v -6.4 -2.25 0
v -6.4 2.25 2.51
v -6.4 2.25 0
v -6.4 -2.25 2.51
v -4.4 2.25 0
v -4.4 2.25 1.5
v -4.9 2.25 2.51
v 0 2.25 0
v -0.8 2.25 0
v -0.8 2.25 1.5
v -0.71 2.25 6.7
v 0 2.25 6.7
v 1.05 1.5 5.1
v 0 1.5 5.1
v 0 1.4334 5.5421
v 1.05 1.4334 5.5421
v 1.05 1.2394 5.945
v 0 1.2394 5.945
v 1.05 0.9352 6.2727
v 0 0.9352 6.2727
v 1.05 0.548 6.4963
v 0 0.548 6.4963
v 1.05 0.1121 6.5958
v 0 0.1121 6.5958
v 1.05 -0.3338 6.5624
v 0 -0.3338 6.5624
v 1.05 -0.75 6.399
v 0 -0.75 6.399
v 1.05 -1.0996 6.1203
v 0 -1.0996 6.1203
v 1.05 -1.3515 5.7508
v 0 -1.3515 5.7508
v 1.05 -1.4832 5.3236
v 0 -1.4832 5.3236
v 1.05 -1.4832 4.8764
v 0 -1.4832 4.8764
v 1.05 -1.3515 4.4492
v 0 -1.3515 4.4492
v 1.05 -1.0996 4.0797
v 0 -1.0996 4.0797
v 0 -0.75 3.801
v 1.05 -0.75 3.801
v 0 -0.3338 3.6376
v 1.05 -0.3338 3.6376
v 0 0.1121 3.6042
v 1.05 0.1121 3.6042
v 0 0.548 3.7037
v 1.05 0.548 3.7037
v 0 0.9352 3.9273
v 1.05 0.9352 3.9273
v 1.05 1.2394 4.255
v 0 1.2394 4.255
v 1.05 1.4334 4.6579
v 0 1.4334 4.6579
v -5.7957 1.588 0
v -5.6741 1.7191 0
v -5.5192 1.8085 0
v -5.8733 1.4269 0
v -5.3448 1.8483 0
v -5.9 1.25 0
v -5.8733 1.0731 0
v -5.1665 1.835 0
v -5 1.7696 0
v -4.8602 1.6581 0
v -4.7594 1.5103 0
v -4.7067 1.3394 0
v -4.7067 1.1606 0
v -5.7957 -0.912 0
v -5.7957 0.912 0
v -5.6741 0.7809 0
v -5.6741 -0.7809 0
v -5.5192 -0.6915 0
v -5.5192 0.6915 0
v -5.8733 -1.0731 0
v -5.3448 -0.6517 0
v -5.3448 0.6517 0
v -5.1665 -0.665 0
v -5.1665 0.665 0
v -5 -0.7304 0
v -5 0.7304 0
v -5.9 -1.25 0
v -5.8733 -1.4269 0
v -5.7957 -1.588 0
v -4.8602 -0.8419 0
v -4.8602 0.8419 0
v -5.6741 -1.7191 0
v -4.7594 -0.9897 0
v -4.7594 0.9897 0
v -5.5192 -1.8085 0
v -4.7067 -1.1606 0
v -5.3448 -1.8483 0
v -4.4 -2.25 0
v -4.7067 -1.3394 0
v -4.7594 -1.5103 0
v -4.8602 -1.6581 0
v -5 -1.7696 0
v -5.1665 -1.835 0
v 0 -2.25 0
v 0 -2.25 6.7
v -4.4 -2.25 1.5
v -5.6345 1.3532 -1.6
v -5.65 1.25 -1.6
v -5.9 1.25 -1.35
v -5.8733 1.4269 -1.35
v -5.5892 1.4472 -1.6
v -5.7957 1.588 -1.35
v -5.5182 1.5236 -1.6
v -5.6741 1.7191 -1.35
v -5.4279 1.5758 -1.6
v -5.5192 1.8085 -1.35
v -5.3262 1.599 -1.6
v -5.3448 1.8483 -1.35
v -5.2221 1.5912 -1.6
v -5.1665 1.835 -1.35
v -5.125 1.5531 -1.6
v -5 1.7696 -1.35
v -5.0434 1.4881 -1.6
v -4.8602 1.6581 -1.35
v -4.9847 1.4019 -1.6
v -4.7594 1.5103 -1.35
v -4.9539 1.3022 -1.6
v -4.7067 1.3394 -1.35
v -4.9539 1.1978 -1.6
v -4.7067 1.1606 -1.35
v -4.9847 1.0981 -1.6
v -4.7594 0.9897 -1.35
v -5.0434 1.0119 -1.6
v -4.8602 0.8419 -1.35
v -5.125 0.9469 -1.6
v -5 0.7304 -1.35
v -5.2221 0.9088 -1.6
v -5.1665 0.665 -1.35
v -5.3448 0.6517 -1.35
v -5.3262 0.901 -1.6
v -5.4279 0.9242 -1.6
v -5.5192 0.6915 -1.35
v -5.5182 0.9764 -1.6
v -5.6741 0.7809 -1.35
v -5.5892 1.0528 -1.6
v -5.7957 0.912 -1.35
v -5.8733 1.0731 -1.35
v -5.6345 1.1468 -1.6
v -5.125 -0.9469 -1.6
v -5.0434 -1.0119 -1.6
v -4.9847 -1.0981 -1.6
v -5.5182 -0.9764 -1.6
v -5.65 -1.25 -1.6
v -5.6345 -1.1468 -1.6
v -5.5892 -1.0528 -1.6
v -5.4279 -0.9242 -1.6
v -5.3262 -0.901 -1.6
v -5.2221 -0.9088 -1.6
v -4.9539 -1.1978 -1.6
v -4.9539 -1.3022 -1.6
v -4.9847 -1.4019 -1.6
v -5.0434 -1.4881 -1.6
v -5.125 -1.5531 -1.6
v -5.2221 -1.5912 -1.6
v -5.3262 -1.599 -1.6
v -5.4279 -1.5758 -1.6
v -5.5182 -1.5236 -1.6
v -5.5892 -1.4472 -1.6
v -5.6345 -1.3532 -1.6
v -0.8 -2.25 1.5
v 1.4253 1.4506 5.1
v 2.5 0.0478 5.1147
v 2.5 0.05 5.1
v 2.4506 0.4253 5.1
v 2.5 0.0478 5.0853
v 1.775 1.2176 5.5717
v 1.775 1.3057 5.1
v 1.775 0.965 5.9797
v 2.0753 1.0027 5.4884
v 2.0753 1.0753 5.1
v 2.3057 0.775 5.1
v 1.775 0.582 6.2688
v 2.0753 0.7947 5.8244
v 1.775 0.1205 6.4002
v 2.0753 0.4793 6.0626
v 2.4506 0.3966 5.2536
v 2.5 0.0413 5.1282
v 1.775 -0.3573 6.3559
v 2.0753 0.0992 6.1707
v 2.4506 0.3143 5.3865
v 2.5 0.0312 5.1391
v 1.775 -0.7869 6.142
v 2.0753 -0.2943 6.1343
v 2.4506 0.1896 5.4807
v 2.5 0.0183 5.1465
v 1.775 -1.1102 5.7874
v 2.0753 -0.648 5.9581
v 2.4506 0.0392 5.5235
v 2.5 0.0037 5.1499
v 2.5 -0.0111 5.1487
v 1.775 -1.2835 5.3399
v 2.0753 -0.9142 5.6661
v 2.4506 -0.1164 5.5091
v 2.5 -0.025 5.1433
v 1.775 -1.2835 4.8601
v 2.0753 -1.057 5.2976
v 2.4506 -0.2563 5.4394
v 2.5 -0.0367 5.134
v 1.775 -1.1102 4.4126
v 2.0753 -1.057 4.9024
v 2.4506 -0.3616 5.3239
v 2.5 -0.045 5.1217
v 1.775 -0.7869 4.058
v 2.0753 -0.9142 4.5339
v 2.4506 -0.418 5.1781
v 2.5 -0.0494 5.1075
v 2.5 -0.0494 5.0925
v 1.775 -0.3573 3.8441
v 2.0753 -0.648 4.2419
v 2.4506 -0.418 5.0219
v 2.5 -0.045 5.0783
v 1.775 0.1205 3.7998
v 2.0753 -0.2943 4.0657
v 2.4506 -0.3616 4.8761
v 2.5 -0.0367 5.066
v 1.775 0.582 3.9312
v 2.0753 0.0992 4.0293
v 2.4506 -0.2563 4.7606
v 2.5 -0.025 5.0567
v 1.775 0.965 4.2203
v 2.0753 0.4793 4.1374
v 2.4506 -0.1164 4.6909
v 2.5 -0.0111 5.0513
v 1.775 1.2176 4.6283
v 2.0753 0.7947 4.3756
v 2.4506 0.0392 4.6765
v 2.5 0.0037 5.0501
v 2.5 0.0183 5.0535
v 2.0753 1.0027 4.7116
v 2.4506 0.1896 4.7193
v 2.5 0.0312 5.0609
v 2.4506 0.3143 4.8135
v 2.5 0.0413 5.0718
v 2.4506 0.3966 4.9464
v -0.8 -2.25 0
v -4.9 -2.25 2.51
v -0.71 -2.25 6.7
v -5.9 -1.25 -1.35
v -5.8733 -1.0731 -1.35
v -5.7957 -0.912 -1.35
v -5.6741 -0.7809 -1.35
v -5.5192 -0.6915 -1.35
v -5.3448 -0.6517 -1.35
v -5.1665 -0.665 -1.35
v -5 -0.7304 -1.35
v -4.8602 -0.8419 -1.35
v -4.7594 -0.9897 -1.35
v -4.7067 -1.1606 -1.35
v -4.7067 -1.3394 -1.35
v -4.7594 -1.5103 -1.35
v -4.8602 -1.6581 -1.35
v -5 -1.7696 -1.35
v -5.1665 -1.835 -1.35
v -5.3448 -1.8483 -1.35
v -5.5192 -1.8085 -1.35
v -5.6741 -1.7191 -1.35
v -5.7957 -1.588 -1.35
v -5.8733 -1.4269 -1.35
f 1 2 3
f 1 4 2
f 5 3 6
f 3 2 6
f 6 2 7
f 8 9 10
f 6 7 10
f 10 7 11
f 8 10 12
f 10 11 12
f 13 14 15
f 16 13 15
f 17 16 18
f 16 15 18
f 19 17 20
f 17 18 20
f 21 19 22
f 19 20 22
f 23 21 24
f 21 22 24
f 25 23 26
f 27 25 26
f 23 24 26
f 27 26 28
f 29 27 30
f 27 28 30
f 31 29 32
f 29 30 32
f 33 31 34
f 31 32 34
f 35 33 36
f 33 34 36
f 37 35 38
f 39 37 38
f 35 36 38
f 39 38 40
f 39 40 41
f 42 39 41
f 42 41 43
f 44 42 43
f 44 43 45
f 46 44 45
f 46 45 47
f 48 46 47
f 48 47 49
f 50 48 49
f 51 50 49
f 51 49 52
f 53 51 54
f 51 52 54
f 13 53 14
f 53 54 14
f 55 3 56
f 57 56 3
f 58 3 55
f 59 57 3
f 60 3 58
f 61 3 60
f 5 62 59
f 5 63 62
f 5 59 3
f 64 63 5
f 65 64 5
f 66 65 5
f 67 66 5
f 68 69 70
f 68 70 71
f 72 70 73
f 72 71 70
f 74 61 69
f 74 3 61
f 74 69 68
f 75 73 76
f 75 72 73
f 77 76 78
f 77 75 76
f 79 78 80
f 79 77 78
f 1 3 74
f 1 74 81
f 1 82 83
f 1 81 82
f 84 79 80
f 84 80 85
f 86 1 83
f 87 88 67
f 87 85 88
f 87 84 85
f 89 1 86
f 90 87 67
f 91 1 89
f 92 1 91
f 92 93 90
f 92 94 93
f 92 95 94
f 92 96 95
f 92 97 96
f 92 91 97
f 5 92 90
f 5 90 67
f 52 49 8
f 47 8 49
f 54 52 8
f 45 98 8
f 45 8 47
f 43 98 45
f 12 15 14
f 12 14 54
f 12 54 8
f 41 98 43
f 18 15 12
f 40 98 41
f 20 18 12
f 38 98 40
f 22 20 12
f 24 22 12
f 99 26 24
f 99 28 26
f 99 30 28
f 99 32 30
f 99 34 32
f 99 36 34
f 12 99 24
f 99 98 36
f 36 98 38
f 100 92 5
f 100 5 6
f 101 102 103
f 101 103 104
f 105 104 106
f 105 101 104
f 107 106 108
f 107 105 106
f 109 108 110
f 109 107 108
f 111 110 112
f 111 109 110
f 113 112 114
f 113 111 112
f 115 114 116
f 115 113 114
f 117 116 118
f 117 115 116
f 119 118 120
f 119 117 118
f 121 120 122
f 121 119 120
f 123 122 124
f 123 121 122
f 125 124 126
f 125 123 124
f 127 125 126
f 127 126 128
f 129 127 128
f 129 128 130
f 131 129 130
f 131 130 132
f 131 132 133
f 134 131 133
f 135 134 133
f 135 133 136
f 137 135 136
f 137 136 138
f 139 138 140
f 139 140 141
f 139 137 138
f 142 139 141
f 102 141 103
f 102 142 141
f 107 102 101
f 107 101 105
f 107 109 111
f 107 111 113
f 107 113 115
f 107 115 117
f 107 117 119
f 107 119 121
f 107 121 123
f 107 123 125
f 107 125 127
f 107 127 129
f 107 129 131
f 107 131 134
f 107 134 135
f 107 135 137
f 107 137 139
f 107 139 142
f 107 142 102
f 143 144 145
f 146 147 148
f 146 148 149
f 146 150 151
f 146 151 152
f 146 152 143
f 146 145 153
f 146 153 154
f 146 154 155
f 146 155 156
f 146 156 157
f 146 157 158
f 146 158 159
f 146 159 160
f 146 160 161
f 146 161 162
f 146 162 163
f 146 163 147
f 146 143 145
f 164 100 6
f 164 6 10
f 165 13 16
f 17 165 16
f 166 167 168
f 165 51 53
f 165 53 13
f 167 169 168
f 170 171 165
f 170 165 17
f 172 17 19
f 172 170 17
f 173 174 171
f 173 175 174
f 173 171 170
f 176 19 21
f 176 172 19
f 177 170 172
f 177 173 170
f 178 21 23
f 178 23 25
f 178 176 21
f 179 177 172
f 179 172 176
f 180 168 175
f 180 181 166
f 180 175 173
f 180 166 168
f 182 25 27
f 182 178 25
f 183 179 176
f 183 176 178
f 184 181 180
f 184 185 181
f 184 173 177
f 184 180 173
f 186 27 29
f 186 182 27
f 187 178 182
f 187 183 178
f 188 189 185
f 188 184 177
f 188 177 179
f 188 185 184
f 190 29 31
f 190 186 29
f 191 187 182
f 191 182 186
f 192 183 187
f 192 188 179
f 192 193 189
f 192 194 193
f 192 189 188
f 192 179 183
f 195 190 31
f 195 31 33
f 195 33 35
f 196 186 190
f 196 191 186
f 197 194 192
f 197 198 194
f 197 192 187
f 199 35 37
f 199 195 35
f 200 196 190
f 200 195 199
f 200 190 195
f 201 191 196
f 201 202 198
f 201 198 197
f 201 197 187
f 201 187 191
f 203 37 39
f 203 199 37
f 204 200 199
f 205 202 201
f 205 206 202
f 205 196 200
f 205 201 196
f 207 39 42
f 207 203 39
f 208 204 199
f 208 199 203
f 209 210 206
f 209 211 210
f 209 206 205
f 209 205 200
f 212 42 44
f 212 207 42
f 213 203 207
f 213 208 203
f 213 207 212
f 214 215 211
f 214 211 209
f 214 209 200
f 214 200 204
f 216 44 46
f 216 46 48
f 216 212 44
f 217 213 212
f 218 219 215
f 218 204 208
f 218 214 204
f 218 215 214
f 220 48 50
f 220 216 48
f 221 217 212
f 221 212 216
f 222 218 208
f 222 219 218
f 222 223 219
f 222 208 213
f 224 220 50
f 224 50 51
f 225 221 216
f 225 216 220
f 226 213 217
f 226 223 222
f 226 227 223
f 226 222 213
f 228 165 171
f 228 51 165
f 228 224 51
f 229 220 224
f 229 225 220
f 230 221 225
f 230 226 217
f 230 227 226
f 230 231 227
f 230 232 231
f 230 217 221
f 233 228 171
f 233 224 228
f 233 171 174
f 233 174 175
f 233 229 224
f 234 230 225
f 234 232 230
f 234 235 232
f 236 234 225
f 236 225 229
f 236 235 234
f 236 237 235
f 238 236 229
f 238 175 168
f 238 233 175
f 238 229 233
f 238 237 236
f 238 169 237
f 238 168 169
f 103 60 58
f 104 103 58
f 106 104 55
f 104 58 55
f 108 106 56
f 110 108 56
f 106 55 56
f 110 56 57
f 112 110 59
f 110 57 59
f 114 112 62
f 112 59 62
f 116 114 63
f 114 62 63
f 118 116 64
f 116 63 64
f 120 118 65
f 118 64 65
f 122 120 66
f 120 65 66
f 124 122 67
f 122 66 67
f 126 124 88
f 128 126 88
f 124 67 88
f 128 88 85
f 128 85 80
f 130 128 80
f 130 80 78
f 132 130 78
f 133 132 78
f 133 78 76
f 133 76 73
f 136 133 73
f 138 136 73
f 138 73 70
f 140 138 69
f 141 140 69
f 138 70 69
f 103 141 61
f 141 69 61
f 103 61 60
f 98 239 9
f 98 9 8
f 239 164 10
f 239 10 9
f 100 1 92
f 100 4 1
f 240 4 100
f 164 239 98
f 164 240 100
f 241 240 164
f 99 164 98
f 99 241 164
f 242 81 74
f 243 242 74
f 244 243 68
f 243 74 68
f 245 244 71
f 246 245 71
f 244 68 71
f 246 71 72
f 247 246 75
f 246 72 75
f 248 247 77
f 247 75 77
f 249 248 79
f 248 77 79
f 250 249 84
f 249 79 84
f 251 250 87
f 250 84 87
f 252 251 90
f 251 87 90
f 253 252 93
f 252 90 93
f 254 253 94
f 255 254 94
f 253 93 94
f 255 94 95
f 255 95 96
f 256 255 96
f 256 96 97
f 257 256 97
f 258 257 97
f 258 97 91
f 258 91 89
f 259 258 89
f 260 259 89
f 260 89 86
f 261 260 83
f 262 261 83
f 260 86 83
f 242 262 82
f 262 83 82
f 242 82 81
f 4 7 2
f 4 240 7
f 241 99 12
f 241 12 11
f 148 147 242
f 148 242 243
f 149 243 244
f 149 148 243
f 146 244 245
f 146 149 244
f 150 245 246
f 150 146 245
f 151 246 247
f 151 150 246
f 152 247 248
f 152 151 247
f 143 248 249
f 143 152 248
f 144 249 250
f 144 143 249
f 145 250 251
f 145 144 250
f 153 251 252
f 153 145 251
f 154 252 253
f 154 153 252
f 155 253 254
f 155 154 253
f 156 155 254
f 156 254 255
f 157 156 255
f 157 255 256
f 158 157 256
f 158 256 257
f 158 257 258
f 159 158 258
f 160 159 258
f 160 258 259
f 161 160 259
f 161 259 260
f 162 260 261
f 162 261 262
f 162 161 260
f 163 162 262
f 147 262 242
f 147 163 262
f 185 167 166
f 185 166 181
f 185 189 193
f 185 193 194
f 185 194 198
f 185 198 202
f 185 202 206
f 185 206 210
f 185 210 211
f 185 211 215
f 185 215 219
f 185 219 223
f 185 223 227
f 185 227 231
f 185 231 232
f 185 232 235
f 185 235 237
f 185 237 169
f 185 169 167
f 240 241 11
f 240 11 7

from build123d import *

# Parameters (mm, degrees)
PAD_DEPTH    = 2.25
SKETCH001_R  = 0.6
PAD001_DEPTH = 1.6
SKETCH002_R  = 1.5
PAD002_DEPTH = 2.5
FILLET_R     = 1.45
CHAMFER_SIZE = 0.25


with BuildPart() as part:
    # Sketch → Pad (new body, symmetric)
    with BuildSketch(Plane.XZ):
        Polygon((-6.4, 0), (-4.4, 0), (-4.4, 1.5), (-0.8, 1.5), (-0.8, 0), (0, 0), (0, 6.7), (-0.71, 6.7), (-4.9, 2.51), (-6.4, 2.51), align=None)
    extrude(amount=PAD_DEPTH, both=True)

    # Sketch001 → Pad001 (join)
    with BuildSketch(Plane(origin=(0, 0, 0), x_dir=(-1, 0, 0), z_dir=(0, 0, -1))):
        with Locations((5.3, 1.25)):
            Circle(SKETCH001_R)
        with Locations((5.3, -1.25)):
            Circle(SKETCH001_R)
    extrude(amount=PAD001_DEPTH)

    # Sketch002 → Pad002 (join)
    with BuildSketch(Plane.YZ):
        with Locations((0, 5.1)):
            Circle(SKETCH002_R)
    extrude(amount=PAD002_DEPTH)

    # Fillet
    fillet_edges = [part.edges().sort_by_distance(p)[0] for p in [
        (2.5, -1.5, 5.1),
    ]]
    fillet(fillet_edges, radius=FILLET_R)

    # Chamfer
    chamfer_edges = [part.edges().sort_by_distance(p)[0] for p in [
        (-4.7, 1.25, -1.6),
        (-4.7, -1.25, -1.6),
    ]]
    chamfer(chamfer_edges, length=CHAMFER_SIZE)


solid = part.part
